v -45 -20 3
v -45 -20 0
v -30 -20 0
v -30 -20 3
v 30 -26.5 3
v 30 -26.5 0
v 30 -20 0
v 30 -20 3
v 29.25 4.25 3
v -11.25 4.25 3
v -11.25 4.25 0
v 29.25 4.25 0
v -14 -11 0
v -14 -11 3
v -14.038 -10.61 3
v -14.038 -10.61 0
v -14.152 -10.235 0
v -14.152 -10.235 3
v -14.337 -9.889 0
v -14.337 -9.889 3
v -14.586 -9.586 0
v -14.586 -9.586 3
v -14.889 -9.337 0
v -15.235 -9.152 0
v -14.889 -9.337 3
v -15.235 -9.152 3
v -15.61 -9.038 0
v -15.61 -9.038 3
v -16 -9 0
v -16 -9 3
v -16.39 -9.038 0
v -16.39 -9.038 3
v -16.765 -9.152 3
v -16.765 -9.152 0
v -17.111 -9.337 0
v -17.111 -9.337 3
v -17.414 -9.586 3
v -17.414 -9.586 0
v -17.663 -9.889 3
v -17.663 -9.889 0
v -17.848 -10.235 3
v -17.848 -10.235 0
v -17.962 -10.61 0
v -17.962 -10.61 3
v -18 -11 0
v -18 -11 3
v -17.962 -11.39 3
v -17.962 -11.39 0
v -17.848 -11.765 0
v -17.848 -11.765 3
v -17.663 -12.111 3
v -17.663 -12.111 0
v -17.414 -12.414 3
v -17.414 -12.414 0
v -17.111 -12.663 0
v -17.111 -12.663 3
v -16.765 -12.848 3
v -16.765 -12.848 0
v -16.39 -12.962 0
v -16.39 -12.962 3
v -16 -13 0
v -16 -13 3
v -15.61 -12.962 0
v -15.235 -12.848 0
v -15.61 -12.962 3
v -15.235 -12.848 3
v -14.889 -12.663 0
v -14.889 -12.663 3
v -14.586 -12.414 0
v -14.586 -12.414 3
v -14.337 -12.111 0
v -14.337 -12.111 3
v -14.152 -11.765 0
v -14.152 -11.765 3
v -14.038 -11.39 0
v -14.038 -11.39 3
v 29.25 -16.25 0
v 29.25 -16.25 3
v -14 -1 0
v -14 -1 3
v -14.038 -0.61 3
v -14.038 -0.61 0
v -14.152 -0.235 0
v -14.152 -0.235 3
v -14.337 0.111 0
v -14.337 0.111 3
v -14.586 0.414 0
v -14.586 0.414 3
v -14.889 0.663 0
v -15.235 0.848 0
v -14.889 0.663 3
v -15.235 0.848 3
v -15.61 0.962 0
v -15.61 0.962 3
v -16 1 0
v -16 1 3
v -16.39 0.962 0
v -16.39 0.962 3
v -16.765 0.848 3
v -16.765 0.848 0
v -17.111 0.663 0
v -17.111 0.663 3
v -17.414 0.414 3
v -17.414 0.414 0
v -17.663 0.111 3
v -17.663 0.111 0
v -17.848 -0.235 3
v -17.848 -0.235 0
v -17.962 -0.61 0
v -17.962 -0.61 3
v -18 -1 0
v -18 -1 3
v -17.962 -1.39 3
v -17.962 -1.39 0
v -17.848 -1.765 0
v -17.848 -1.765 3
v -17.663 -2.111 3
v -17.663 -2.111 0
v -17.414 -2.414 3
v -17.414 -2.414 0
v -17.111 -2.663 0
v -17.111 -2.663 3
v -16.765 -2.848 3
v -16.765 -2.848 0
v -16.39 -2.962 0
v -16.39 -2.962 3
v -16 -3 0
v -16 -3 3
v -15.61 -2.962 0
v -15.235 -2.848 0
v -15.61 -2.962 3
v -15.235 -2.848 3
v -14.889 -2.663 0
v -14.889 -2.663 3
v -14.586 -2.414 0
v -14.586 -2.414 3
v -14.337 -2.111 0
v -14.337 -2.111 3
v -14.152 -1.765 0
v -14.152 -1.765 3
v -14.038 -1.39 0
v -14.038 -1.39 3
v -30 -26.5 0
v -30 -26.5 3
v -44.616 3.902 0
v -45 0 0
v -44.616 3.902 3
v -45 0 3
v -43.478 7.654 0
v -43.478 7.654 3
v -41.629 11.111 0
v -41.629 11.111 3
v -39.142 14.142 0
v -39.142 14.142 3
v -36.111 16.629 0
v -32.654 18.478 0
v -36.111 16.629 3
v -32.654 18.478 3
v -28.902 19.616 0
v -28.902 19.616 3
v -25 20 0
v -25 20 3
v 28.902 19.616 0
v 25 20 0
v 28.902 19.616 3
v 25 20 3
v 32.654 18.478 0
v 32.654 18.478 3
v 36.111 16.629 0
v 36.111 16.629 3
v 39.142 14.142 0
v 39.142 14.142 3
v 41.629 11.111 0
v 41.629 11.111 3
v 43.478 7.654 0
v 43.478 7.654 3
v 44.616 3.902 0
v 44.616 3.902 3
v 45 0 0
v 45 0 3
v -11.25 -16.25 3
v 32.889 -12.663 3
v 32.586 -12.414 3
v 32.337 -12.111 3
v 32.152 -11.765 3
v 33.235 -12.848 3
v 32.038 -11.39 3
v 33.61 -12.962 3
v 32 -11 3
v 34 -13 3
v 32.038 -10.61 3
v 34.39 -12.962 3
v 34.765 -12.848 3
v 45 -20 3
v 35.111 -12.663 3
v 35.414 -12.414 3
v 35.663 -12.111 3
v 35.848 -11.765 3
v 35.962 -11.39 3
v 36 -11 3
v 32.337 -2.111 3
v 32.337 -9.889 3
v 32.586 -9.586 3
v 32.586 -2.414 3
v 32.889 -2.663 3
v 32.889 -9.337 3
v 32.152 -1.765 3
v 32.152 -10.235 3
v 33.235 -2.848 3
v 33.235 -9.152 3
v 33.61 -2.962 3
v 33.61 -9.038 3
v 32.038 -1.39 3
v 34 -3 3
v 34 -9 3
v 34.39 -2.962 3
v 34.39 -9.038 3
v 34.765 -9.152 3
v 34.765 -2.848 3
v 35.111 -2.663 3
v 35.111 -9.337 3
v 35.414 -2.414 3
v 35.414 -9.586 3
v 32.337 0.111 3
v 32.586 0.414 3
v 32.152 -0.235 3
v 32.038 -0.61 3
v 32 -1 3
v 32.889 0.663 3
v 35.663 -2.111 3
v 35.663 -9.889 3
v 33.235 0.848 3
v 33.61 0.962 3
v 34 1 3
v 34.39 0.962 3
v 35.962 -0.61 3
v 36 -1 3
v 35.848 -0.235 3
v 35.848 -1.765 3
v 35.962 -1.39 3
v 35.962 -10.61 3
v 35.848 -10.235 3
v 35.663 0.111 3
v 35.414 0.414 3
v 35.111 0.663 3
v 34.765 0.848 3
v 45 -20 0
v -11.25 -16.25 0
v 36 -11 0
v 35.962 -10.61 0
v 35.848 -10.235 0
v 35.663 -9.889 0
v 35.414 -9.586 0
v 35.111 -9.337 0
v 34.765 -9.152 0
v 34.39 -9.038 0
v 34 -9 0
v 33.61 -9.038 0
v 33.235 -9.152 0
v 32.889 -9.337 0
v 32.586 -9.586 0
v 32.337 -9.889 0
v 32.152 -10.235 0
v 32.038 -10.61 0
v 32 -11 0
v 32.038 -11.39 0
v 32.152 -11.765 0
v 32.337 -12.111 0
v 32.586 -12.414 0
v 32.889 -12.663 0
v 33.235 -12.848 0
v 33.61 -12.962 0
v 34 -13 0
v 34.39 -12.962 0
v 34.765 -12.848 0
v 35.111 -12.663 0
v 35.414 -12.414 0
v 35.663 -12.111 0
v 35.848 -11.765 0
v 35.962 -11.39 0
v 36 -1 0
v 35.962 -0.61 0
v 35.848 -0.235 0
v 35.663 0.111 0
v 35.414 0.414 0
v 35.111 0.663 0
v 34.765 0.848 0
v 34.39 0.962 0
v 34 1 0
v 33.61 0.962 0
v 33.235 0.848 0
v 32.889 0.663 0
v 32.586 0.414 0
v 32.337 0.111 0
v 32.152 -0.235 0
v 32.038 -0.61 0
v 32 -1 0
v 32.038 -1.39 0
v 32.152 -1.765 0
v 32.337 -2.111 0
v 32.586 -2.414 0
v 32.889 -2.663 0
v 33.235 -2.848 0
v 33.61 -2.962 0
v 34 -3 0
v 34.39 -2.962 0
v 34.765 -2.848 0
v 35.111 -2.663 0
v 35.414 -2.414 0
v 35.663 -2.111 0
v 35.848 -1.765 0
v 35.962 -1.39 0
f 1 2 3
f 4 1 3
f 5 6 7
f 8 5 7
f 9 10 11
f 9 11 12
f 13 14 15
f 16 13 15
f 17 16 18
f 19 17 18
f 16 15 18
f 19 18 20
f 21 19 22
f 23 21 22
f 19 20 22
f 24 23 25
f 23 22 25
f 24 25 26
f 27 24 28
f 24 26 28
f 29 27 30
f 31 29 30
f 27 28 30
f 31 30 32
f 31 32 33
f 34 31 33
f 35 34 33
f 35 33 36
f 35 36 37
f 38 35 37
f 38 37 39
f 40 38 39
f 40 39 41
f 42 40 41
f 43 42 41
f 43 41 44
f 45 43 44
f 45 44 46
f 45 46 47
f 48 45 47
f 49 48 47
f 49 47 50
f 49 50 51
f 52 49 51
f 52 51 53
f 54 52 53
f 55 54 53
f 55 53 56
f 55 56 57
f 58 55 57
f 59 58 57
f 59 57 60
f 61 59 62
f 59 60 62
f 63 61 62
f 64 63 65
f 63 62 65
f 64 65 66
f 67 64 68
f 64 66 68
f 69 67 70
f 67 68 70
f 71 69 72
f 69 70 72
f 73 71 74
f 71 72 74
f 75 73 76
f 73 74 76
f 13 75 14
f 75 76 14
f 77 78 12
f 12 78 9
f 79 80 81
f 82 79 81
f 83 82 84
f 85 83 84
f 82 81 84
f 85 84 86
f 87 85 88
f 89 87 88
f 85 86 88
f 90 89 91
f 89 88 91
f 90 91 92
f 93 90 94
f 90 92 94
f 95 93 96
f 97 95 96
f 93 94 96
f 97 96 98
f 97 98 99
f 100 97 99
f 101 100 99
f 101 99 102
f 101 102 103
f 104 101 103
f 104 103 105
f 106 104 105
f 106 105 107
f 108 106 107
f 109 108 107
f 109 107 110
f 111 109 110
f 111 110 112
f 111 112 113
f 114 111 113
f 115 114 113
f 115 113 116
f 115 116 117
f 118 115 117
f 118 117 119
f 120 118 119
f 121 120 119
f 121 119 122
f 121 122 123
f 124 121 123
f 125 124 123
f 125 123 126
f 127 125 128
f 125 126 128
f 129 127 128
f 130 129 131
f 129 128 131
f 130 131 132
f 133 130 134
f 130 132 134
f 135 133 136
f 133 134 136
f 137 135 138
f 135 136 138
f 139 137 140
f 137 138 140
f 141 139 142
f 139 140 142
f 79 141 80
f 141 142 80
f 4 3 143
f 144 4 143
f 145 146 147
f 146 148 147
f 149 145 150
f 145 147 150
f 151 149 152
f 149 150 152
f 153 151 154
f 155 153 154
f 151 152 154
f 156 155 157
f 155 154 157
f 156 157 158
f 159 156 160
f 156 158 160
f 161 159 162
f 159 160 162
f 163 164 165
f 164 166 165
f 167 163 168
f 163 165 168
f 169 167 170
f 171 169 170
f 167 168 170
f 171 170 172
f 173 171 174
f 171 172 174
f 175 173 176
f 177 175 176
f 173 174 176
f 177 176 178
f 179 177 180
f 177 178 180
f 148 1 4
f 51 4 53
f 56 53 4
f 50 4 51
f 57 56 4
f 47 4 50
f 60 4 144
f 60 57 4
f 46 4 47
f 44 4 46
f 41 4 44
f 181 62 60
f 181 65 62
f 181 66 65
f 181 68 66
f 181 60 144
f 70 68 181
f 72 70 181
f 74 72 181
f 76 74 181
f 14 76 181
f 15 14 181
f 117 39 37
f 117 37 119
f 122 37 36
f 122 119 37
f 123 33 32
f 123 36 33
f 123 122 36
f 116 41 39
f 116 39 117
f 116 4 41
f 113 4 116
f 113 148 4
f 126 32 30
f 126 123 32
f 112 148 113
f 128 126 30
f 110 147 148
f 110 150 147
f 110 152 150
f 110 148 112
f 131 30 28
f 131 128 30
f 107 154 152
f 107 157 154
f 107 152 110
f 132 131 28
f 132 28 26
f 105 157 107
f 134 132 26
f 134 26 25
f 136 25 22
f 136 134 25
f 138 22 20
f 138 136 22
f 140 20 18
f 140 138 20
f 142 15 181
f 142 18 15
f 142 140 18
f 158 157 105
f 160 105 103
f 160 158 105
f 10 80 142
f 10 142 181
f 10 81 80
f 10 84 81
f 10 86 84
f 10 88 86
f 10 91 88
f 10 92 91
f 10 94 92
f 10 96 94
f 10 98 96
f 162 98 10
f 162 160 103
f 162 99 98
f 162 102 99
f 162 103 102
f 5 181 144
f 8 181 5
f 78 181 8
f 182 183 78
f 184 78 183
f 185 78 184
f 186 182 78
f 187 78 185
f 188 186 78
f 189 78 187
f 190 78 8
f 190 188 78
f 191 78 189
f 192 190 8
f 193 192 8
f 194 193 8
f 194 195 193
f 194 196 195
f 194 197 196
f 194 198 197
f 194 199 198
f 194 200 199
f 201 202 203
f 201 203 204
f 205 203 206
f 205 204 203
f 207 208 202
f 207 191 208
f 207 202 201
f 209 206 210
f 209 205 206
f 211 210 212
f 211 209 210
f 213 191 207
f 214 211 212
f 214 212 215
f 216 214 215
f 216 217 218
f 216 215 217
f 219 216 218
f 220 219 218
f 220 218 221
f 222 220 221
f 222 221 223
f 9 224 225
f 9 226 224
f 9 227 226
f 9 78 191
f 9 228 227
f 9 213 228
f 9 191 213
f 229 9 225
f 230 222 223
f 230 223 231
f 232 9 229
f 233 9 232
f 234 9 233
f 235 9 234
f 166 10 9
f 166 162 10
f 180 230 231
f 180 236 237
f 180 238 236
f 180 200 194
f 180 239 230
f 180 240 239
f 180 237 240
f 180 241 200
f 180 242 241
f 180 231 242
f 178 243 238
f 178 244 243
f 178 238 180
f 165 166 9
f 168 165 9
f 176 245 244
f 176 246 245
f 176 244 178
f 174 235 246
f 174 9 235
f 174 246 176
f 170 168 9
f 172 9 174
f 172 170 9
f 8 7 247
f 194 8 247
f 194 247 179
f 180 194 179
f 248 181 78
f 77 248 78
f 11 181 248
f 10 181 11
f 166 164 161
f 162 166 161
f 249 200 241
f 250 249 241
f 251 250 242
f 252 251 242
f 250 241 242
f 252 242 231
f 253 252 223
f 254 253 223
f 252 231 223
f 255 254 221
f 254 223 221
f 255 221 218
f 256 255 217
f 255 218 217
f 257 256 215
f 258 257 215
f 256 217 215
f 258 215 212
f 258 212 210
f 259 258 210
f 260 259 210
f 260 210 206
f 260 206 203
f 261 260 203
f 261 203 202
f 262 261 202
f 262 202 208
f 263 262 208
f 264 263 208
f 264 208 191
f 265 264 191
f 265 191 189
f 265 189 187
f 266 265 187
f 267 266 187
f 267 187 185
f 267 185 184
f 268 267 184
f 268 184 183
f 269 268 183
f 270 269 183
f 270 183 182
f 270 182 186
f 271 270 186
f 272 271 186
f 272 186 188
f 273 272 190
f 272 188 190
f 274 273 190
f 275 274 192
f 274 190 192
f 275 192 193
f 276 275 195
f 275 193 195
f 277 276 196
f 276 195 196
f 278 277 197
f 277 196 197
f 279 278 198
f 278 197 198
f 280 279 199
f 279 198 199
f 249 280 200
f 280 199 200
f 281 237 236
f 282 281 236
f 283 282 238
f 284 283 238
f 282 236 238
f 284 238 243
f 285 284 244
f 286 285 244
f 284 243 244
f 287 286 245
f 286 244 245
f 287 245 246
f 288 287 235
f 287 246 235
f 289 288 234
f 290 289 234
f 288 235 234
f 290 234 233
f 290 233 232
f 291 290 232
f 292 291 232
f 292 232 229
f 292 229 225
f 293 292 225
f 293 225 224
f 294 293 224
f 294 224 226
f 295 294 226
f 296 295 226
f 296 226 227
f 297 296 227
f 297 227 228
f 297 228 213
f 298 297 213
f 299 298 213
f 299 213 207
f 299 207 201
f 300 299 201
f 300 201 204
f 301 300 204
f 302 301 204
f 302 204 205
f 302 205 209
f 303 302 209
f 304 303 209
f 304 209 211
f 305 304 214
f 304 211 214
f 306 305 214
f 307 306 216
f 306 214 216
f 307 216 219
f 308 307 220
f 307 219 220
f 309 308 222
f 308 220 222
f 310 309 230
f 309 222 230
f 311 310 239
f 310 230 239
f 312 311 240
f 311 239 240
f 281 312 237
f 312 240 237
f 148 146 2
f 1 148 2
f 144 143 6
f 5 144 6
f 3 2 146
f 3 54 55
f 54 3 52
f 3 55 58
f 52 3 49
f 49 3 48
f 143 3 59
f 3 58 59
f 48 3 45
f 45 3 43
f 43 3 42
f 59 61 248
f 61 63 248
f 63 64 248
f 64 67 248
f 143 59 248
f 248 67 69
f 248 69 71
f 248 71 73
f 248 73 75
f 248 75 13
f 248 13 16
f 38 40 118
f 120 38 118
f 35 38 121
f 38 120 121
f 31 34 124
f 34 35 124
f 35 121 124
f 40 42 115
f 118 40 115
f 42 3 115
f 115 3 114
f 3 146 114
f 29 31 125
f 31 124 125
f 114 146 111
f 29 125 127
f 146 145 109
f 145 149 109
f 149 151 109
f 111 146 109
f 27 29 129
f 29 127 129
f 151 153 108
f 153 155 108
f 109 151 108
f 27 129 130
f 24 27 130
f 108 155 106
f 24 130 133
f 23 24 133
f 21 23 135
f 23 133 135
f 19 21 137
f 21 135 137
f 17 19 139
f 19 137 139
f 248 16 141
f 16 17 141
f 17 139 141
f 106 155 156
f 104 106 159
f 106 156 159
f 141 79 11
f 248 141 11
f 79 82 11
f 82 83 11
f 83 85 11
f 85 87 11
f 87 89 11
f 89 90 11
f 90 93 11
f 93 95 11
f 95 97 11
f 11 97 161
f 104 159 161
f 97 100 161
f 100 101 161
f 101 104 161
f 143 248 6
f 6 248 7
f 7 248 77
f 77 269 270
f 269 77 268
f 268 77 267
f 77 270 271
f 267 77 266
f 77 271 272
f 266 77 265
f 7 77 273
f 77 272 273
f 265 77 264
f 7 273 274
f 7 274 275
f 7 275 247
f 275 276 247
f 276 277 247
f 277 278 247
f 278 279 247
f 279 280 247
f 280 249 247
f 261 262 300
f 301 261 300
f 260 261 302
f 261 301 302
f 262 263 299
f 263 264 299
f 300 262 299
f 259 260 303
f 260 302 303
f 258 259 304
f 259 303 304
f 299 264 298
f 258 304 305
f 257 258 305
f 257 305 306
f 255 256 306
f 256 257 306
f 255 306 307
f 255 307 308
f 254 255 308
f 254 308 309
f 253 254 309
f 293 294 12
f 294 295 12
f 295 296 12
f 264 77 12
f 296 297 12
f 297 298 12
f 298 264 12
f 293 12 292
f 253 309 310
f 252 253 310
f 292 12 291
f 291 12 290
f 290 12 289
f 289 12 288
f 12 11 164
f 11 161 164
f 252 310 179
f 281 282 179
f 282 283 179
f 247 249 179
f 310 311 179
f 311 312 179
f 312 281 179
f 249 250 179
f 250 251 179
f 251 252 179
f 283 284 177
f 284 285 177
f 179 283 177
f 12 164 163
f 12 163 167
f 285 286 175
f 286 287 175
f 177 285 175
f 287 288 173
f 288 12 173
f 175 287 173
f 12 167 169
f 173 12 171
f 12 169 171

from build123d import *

# Parameters (mm, degrees)
SALIENTE_EXTRUIR1_DEPTH = 3
CORTAR_EXTRUIR1_REACH   = 5
CROQUIS2_W              = 40.5
CROQUIS2_H              = 20.5
REDONDEO1_R             = 20
CORTAR_EXTRUIR2_REACH   = 5
CROQUIS3_R              = 2


with BuildPart() as part:
    # Croquis1 → Saliente-Extruir1 (new body)
    with BuildSketch(Plane.XY):
        Polygon((-45, -20), (-30, -20), (-30, -26.5), (30, -26.5), (30, -20), (45, -20), (45, 20), (-45, 20), align=None)
    extrude(amount=SALIENTE_EXTRUIR1_DEPTH)

    # Croquis2 → Cortar-Extruir1 (cut, up to next)
    with BuildSketch(Plane.XY.offset(3), mode=Mode.PRIVATE) as cortar_extruir1_sk1:
        with Locations((9, -6)):
            Rectangle(CROQUIS2_W, CROQUIS2_H)
    cortar_extruir1_tool1 = extrude(cortar_extruir1_sk1.sketch, amount=-CORTAR_EXTRUIR1_REACH, mode=Mode.PRIVATE) & part.part
    add(cortar_extruir1_tool1.solids().sort_by_distance((9, -6, 3))[0], mode=Mode.SUBTRACT)

    # Redondeo1
    redondeo1_edges = [part.edges().sort_by_distance(p)[0] for p in [
        (-45, 20, 1.5),
        (45, 20, 1.5),
    ]]
    fillet(redondeo1_edges, radius=REDONDEO1_R)

    # Croquis3 → Cortar-Extruir2 (cut, up to next)
    with BuildSketch(Plane.XY.offset(3), mode=Mode.PRIVATE) as cortar_extruir2_sk1:
        with Locations((34, -1)):
            Circle(CROQUIS3_R)
    cortar_extruir2_tool1 = extrude(cortar_extruir2_sk1.sketch, amount=-CORTAR_EXTRUIR2_REACH, mode=Mode.PRIVATE) & part.part
    add(cortar_extruir2_tool1.solids().sort_by_distance((34, -1, 3))[0], mode=Mode.SUBTRACT)
    # Croquis3 → Cortar-Extruir2 (cut, up to next)
    with BuildSketch(Plane.XY.offset(3), mode=Mode.PRIVATE) as cortar_extruir2_sk2:
        with Locations((-16, -1)):
            Circle(CROQUIS3_R)
    cortar_extruir2_tool2 = extrude(cortar_extruir2_sk2.sketch, amount=-CORTAR_EXTRUIR2_REACH, mode=Mode.PRIVATE) & part.part
    add(cortar_extruir2_tool2.solids().sort_by_distance((-16, -1, 3))[0], mode=Mode.SUBTRACT)
    # Croquis3 → Cortar-Extruir2 (cut, up to next)
    with BuildSketch(Plane.XY.offset(3), mode=Mode.PRIVATE) as cortar_extruir2_sk3:
        with Locations((34, -11)):
            Circle(CROQUIS3_R)
    cortar_extruir2_tool3 = extrude(cortar_extruir2_sk3.sketch, amount=-CORTAR_EXTRUIR2_REACH, mode=Mode.PRIVATE) & part.part
    add(cortar_extruir2_tool3.solids().sort_by_distance((34, -11, 3))[0], mode=Mode.SUBTRACT)
    # Croquis3 → Cortar-Extruir2 (cut, up to next)
    with BuildSketch(Plane.XY.offset(3), mode=Mode.PRIVATE) as cortar_extruir2_sk4:
        with Locations((-16, -11)):
            Circle(CROQUIS3_R)
    cortar_extruir2_tool4 = extrude(cortar_extruir2_sk4.sketch, amount=-CORTAR_EXTRUIR2_REACH, mode=Mode.PRIVATE) & part.part
    add(cortar_extruir2_tool4.solids().sort_by_distance((-16, -11, 3))[0], mode=Mode.SUBTRACT)


solid = part.part
